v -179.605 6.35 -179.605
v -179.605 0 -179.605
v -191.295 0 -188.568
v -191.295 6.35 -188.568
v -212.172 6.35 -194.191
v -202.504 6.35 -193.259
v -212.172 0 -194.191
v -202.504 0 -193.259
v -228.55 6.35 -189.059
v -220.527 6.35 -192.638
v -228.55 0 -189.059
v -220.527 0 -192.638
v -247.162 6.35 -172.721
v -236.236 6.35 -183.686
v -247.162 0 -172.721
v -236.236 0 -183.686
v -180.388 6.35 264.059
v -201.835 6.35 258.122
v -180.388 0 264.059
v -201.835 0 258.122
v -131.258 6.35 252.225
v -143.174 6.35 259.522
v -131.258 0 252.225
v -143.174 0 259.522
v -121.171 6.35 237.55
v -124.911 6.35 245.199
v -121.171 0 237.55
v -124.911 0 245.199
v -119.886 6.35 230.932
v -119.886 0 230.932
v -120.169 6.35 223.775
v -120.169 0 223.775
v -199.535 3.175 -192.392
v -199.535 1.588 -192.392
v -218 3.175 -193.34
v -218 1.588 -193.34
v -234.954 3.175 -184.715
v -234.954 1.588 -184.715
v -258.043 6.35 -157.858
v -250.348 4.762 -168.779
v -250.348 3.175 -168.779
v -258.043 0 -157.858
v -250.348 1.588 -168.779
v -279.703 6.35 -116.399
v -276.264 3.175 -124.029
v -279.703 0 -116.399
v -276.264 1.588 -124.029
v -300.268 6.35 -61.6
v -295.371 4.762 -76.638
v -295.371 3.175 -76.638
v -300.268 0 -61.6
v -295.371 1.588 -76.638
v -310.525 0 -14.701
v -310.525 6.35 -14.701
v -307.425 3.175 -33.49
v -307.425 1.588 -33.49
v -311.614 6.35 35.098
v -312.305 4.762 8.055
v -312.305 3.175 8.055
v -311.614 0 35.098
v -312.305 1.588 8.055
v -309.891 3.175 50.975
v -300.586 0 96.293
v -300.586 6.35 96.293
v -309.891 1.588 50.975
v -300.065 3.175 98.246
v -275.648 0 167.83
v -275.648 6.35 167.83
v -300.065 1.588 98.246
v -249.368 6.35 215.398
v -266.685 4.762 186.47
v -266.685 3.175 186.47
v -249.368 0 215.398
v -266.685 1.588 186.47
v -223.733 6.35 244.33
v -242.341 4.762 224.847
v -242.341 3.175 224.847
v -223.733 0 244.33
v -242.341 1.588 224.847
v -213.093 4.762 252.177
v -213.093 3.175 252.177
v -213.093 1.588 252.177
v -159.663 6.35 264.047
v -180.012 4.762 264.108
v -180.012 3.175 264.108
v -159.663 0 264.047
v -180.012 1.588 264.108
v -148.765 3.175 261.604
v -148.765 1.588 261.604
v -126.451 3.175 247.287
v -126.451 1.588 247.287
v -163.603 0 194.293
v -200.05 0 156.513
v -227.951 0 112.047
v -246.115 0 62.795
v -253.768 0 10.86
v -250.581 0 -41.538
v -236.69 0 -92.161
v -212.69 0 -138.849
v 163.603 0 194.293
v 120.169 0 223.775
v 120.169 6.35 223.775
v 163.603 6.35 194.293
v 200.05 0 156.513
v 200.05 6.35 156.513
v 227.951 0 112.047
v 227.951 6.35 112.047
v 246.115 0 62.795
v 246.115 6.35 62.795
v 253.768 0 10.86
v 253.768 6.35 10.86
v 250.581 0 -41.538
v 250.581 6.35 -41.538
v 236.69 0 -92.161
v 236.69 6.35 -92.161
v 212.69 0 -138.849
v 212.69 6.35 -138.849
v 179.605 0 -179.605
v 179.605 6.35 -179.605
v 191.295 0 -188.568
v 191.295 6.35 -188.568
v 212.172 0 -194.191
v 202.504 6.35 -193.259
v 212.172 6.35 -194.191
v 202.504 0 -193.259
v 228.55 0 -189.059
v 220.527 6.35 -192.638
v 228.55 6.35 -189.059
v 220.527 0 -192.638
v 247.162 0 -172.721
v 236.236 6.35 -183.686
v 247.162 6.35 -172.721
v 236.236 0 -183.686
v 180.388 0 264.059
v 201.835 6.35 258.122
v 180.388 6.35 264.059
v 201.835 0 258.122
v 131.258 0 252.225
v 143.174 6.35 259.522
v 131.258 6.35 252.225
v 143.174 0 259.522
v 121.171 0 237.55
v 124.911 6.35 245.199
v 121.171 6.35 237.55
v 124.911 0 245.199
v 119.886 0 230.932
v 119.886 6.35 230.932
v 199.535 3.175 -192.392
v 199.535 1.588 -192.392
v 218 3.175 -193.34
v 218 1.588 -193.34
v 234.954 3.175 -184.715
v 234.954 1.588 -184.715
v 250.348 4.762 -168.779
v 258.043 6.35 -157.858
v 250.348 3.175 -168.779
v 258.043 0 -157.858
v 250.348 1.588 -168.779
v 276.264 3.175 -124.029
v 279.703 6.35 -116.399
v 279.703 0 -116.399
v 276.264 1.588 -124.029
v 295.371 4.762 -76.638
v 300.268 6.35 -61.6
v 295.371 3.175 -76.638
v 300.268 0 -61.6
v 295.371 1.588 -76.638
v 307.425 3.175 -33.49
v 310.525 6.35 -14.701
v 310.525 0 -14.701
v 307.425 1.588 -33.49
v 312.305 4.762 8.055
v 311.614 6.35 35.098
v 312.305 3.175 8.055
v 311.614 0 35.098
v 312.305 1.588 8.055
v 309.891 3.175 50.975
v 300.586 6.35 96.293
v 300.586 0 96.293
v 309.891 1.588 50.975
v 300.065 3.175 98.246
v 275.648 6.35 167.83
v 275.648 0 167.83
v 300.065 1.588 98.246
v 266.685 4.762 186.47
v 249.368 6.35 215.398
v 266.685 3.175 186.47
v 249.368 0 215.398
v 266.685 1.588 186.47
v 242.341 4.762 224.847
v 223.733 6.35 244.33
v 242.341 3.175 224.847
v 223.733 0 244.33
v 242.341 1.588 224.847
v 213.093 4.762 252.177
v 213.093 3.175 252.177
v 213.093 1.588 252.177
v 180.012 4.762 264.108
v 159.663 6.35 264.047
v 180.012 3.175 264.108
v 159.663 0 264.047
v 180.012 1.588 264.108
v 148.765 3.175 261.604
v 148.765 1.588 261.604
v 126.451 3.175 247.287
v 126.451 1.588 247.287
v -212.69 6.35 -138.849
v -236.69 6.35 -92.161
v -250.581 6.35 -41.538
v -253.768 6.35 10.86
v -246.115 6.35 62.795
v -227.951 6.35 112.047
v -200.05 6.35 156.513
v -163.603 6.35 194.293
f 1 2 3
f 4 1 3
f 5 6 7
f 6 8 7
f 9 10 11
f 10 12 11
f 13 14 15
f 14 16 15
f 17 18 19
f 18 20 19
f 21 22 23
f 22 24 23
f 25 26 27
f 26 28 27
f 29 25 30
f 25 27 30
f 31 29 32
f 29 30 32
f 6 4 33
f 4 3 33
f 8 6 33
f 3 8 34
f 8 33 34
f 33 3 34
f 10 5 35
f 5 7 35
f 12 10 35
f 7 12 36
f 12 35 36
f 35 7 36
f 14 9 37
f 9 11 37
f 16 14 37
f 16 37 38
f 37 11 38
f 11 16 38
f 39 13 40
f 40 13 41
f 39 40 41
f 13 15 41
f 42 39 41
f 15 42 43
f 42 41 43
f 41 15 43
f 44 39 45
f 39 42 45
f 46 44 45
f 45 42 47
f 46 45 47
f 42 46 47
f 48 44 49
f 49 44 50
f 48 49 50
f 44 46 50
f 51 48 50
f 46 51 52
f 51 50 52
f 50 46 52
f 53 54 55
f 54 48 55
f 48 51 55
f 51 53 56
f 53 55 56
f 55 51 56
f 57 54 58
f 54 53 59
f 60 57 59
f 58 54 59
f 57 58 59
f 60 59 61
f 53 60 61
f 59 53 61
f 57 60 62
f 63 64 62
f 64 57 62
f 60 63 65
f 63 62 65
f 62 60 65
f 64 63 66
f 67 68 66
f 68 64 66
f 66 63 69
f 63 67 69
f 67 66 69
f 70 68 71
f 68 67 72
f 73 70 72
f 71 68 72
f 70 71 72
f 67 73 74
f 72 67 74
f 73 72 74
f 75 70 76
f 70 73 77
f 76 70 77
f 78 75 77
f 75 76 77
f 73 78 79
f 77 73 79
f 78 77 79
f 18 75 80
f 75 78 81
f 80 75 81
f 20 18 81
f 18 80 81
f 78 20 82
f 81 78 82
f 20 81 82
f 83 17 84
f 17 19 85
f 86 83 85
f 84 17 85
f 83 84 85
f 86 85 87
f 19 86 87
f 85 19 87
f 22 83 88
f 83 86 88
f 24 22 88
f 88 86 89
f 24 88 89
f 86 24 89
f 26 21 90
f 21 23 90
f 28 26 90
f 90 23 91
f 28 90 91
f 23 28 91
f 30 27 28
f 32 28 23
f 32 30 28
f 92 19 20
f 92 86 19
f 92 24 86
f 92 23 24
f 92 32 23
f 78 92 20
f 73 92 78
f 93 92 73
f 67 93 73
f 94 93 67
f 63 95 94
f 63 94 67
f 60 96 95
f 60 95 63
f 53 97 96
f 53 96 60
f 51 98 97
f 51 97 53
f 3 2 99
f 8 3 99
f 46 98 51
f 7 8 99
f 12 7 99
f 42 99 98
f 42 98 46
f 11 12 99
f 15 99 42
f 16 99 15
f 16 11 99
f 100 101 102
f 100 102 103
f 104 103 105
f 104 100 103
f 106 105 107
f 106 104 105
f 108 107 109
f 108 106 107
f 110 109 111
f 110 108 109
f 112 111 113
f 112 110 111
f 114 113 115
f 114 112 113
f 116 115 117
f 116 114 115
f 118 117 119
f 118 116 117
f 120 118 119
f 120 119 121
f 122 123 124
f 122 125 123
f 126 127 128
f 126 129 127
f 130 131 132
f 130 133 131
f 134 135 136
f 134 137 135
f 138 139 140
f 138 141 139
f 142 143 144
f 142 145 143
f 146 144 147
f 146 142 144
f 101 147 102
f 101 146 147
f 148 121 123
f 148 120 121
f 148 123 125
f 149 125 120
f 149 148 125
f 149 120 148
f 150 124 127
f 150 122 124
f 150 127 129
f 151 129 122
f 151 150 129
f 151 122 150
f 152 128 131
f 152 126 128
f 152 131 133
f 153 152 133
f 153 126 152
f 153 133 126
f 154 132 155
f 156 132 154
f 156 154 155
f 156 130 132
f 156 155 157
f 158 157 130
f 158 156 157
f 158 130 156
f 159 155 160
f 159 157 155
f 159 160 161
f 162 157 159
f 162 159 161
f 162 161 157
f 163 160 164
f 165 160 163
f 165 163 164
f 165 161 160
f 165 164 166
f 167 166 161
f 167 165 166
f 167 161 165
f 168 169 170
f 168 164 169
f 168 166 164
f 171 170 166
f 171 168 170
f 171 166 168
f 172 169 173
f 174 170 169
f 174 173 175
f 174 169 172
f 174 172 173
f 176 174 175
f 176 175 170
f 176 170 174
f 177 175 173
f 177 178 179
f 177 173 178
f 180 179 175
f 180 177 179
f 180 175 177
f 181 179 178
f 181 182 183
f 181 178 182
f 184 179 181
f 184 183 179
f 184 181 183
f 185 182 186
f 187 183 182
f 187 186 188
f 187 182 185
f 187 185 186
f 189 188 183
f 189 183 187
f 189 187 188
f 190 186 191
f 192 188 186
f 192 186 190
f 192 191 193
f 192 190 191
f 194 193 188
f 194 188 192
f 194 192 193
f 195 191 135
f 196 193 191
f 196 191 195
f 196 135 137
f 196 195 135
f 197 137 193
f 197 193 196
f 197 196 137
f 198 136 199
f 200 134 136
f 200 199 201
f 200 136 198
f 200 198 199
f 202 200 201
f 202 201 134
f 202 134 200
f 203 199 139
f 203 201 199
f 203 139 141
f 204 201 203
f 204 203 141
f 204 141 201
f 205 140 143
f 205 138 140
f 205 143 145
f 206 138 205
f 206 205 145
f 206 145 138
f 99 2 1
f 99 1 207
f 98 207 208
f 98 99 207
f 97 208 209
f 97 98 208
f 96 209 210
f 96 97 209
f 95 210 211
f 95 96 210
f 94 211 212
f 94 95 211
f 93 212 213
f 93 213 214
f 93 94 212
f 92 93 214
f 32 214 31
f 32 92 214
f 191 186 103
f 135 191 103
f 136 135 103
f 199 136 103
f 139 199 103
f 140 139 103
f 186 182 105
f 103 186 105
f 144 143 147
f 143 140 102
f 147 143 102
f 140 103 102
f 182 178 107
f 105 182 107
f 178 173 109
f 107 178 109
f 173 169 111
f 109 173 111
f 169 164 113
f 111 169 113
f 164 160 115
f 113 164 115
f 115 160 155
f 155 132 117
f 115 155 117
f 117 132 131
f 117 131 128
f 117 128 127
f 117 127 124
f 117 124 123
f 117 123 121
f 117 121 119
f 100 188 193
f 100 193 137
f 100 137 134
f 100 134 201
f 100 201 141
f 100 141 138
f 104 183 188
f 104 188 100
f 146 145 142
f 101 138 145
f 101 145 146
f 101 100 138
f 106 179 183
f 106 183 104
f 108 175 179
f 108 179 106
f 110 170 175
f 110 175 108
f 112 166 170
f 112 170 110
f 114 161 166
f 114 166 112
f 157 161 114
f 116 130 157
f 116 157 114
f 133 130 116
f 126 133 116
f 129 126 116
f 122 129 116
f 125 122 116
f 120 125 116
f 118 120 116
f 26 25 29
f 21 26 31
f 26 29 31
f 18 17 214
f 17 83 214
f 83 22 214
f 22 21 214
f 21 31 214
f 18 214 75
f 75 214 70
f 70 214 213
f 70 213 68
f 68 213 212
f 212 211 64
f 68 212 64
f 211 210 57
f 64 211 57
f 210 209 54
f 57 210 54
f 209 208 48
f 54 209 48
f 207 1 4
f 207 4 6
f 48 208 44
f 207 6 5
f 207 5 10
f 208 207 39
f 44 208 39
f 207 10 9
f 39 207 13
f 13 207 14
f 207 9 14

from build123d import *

# Parameters (mm, degrees)
BOSS_EXTRUDE1_DEPTH   = 6.35
BOSS_EXTRUDE1_2_DEPTH = 6.35


with BuildPart() as part:
    # Sketch1 → Boss-Extrude1 (new body)
    with BuildSketch(Plane(origin=(0, 0, 0), x_dir=(1, 0, 0), z_dir=(0, 1, 0))):
        with BuildLine():
            ThreePointArc((-179.605122421, 179.605122421), (-251.286873815, -37.025761955), (-120.169206136, -223.775248624))
            add(Edge.make_bspline(
                [(-179.605122421, 179.605122421), (-227.185128051, 224.453544186), (-311.192726479, 68.250260732), (-324.660877097, -60.538165424), (-224.970761471, -297.63369959), (-114.802406282, -259.422683492), (-120.169206136, -223.775248624)],
                knots=[0, 0, 0, 0, 0.234475694, 0.54261701, 0.775501398, 1, 1, 1, 1], degree=3))
        make_face()
    extrude(amount=BOSS_EXTRUDE1_DEPTH)


with BuildPart() as body_2:
    # Sketch1 → Boss-Extrude1 2 (new body)
    with BuildSketch(Plane(origin=(0, 0, 0), x_dir=(1, 0, 0), z_dir=(0, 1, 0))):
        with BuildLine():
            ThreePointArc((120.169206136, -223.775248624), (251.286873815, -37.025761955), (179.605122421, 179.605122421))
            add(Edge.make_bspline(
                [(179.605122421, 179.605122421), (227.185128051, 224.453544186), (311.192726479, 68.250260732), (324.660877097, -60.538165424), (224.970761471, -297.63369959), (114.802406282, -259.422683492), (120.169206136, -223.775248624)],
                knots=[0, 0, 0, 0, 0.234475694, 0.54261701, 0.775501398, 1, 1, 1, 1], degree=3))
        make_face()
    extrude(amount=BOSS_EXTRUDE1_2_DEPTH)


solid = Compound([part.part, body_2.part])
